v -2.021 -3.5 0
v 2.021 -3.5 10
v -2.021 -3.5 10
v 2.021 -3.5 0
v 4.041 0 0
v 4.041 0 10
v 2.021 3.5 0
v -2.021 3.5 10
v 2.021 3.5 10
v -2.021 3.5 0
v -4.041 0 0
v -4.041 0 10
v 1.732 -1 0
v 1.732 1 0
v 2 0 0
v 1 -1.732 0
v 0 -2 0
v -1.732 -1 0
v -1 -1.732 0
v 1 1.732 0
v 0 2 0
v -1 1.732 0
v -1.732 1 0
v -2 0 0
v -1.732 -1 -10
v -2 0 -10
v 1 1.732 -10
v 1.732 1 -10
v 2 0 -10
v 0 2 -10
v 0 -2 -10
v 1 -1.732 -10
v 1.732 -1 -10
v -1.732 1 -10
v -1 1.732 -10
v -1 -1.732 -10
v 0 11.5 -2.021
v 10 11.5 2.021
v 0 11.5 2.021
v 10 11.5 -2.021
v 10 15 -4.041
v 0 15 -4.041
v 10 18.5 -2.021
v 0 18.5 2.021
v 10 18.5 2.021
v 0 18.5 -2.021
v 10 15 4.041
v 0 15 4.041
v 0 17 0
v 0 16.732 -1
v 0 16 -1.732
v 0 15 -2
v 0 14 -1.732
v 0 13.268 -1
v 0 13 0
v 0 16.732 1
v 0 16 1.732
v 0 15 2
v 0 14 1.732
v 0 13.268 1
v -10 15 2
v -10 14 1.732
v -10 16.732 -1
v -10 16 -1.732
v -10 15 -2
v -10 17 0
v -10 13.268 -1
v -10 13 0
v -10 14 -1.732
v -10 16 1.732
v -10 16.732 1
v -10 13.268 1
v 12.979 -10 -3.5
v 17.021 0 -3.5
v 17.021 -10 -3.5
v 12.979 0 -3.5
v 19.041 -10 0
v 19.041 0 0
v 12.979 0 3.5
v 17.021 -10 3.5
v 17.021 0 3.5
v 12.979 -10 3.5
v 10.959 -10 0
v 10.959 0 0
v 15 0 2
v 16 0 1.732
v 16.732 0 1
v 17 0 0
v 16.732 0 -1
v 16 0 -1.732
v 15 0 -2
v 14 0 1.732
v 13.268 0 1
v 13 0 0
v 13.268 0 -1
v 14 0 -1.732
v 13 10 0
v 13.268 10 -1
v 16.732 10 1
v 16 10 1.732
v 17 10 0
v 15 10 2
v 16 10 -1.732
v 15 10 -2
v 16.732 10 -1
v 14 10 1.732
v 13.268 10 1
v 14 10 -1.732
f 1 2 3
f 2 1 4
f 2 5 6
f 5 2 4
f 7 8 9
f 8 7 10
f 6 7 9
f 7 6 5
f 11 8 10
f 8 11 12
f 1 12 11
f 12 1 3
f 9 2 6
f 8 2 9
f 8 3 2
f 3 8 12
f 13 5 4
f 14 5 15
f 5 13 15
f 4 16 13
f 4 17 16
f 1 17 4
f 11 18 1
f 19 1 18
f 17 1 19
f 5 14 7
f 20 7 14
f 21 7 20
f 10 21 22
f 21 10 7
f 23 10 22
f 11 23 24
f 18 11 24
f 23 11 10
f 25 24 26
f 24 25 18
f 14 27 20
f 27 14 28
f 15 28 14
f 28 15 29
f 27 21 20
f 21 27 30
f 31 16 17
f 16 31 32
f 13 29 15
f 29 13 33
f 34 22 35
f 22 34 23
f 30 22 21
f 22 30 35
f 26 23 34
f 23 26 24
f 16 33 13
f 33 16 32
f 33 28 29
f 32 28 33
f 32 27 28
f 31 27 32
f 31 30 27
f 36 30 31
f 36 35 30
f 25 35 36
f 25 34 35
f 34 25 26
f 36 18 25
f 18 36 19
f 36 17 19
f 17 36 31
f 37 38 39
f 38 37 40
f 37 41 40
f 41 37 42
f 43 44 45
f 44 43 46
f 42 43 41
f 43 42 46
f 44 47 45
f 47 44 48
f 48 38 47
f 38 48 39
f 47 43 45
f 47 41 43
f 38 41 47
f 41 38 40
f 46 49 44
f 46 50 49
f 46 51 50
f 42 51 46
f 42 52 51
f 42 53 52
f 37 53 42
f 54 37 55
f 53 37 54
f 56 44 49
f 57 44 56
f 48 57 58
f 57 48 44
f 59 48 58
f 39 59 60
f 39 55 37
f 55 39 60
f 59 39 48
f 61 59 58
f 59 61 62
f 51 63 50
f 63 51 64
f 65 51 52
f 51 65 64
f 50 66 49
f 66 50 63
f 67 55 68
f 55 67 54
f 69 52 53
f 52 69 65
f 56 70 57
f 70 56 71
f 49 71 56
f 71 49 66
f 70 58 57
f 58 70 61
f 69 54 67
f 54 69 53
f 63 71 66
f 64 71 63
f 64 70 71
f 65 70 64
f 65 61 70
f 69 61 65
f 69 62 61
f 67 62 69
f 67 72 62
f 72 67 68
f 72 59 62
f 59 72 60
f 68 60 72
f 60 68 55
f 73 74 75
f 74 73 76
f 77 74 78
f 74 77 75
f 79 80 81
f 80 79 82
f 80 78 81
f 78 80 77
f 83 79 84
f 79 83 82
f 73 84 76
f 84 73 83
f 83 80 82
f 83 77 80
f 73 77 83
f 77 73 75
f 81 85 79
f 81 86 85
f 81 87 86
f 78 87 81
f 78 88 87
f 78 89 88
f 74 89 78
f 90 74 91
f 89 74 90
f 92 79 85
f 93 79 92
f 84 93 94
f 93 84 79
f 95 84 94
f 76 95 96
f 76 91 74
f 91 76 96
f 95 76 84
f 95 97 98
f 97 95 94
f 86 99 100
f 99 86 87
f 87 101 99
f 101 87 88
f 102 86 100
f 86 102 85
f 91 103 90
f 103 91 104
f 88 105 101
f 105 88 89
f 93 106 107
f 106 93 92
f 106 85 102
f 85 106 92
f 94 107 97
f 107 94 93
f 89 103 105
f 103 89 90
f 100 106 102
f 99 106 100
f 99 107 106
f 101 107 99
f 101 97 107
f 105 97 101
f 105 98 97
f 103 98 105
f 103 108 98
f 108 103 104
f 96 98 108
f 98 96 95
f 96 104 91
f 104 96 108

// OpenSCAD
// Vertical screw hole nut recess with base of nut centred on origin 
//
// af = nut size across faces
// oh = overall height (screw + head + recesss)
// sd = screw diameter
// sh = screw height (to shoulder of nut recess)
//
module nutrecessZ(af, oh, sd, sh)
{
  sin60 = sin(60);
  union()
  {
    // % translate([0,0,oh-sh]) cylinder(r=af/sin60/2, h=5, $fn=12);
    // Square shoulder...
    //cylinder(r=af/sin60/2, h=oh-sh, $fn=6);
    // Angle shoulder at 45deg for printing...
    intersection()
    {
        translate([0,0,0]) cylinder(r=af/sin60/2, h=oh-sh, $fn=6);
        //translate([0,0,-((af/2)-(sd/2))/2])
        //  cylinder(r1=sd/2, r2=sd/2+(oh-sh), h=oh-sh, $fn=12);
    }
    translate([0,0,-sh]) cylinder(r=sd/2, h=oh, $fn=12);
  }
}

// Nut recess with screw directed along negative X-axis
module nutrecessX(af, oh, sd, sh)
{
    rotate([0,90,0]) nutrecessZ(af, oh, sd, sh);
}

// Nut recess with screw directed along negative Y-axis
module nutrecessY(af, oh, sd, sh)
{
    rotate([90,0,0]) nutrecessZ(af, oh, sd, sh);
}


// Examples
nutrecessZ(7, 20, 4, 10);

translate([0,15,0]) nutrecessX(7, 20, 4, 10);

translate([15,0,0]) nutrecessY(7, 20, 4, 10);
